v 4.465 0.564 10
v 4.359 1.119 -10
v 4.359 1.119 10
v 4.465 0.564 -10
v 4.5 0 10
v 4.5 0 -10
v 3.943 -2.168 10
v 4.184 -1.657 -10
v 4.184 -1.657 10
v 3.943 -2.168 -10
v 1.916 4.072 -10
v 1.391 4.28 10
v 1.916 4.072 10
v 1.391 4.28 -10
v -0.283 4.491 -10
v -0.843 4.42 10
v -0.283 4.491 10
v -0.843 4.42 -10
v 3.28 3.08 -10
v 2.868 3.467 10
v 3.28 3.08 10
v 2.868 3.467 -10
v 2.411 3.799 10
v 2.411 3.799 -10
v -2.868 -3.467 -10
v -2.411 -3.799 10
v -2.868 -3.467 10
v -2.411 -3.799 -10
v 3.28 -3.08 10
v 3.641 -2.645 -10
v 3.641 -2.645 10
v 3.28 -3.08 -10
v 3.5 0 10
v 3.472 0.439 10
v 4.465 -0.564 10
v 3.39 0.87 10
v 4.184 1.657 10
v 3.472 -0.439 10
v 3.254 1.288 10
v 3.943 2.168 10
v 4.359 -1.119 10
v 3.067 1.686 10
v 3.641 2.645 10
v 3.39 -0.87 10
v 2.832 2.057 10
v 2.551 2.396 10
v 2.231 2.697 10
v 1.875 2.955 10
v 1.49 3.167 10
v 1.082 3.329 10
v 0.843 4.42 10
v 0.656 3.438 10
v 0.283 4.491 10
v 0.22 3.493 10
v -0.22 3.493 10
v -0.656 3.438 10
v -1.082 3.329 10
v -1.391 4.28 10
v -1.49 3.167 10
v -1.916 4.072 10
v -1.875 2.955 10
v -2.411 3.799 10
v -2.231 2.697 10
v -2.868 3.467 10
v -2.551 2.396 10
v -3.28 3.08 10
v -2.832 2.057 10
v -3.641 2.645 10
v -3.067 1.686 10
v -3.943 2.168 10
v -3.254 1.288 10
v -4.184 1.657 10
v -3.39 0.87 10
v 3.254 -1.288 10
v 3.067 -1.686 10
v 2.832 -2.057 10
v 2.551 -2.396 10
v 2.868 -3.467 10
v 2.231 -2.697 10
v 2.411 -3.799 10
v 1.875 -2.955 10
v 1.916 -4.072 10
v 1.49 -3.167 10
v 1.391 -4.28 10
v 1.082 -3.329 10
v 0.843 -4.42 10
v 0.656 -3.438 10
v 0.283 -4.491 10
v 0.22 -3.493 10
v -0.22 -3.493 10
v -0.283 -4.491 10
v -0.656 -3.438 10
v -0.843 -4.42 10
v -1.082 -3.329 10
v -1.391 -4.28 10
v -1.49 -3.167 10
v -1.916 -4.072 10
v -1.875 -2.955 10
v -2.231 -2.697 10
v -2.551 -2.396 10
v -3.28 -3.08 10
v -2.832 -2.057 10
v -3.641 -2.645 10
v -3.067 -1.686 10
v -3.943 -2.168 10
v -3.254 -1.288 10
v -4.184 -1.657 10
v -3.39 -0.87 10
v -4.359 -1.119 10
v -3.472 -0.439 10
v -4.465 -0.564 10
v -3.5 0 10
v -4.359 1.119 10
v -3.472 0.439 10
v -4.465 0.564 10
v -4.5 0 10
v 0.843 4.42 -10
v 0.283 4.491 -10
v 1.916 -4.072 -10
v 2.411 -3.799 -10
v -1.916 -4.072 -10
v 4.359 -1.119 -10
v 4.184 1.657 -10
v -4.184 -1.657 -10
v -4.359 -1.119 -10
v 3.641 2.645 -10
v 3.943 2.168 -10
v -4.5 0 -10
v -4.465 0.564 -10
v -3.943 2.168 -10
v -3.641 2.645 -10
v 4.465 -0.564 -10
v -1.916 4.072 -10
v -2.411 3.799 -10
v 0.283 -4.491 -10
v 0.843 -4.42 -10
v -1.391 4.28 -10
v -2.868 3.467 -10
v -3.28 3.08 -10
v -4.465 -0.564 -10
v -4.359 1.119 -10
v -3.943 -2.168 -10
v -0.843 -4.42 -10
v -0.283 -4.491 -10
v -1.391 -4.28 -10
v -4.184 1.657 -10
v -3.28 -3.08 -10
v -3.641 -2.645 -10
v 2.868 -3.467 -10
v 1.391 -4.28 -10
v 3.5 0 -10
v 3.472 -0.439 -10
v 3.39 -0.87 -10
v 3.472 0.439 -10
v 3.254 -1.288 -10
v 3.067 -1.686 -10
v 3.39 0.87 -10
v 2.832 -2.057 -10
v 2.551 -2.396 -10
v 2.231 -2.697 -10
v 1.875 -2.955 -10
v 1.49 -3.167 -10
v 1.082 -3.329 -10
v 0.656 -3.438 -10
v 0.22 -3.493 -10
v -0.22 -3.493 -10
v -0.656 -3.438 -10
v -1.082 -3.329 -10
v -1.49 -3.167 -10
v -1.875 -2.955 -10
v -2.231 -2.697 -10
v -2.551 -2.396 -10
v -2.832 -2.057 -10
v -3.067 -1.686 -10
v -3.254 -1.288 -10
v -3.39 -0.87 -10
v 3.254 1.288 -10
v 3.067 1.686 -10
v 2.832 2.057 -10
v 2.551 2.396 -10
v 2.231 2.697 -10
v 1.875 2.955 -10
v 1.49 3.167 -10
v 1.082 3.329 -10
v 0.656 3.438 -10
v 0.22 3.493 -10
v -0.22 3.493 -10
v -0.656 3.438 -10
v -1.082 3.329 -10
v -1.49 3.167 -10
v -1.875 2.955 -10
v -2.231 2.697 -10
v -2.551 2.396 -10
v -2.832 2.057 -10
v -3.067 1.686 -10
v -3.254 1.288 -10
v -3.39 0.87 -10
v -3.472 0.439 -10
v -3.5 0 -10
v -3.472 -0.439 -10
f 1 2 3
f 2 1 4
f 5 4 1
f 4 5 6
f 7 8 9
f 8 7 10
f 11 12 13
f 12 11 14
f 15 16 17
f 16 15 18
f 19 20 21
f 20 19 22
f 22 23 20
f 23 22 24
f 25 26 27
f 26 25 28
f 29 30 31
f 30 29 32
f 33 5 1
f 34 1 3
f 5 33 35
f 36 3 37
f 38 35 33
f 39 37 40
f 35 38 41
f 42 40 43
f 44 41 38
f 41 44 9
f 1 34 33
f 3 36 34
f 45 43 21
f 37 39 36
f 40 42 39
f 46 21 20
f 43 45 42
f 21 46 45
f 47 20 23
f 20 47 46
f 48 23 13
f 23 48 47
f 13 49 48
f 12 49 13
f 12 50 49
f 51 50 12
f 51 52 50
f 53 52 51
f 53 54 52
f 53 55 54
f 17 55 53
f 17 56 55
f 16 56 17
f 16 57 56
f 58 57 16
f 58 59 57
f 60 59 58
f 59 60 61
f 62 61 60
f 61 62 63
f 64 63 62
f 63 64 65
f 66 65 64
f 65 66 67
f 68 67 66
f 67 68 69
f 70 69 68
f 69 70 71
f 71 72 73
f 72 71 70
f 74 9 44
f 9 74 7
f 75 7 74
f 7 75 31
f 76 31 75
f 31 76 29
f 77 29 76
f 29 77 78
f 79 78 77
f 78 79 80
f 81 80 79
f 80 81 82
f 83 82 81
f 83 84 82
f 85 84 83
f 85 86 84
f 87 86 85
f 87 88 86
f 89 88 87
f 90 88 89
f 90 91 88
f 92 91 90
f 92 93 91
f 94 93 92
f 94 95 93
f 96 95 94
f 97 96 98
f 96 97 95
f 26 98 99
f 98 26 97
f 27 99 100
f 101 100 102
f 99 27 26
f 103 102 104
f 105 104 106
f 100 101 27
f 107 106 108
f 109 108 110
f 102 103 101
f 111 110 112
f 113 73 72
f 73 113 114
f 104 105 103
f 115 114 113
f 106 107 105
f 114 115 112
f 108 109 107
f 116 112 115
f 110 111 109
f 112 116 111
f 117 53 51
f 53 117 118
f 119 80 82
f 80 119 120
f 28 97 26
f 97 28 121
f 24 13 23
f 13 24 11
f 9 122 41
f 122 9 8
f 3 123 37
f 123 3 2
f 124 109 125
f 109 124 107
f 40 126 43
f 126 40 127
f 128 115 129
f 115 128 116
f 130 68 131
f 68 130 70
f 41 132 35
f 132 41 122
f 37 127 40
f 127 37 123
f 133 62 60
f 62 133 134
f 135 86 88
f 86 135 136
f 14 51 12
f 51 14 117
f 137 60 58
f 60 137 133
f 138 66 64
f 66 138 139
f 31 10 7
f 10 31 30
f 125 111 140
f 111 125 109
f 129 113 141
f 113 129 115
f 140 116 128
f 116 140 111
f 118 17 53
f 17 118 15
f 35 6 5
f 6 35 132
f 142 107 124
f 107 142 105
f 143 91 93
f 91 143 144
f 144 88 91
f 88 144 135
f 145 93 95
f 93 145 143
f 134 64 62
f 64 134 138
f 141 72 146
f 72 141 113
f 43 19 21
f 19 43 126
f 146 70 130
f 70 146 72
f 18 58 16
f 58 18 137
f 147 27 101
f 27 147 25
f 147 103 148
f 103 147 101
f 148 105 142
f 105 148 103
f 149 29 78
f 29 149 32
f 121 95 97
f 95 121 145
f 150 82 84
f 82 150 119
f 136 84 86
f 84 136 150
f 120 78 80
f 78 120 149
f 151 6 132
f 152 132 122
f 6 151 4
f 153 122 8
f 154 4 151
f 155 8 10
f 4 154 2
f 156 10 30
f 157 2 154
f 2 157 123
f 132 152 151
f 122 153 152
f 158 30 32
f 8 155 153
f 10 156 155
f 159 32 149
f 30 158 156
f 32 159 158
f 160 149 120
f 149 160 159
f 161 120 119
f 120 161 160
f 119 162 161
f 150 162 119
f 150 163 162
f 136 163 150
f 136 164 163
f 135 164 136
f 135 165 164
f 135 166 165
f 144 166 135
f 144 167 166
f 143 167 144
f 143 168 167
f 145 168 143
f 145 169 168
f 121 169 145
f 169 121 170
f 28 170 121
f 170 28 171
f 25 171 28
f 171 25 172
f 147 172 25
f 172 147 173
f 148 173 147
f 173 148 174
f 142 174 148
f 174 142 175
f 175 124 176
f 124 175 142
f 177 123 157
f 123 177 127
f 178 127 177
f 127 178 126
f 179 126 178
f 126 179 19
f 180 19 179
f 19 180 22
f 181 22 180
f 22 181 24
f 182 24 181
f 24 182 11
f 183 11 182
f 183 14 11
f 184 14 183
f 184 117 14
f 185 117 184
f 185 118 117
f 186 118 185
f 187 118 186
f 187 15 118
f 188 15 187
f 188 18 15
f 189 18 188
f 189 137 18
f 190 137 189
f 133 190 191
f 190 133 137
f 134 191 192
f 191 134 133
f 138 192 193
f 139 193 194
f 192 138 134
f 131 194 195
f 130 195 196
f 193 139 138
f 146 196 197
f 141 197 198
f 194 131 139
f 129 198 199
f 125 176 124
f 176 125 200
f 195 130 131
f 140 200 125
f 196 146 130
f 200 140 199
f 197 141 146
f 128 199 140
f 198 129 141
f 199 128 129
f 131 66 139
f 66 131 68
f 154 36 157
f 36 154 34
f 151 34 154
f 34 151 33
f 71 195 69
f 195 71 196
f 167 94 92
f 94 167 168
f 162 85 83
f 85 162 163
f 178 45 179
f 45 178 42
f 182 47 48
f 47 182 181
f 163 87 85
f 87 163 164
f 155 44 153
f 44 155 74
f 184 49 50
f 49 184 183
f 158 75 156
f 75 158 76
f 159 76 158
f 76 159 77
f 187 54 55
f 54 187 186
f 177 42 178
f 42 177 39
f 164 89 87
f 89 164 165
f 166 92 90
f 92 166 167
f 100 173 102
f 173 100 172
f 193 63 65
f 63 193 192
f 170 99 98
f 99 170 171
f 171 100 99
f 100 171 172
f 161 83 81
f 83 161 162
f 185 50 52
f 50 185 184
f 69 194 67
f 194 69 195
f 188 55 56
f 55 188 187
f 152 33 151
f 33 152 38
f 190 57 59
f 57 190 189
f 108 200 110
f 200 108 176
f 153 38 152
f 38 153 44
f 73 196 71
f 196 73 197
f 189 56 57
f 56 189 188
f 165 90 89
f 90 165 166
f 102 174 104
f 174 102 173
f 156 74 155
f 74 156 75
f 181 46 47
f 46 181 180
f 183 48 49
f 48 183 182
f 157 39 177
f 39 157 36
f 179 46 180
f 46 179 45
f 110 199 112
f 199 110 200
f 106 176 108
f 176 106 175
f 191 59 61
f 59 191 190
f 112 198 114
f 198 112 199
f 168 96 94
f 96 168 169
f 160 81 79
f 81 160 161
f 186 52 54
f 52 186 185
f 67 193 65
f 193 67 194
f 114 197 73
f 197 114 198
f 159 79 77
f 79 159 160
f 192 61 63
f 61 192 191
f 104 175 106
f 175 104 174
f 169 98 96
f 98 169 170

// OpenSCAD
$fn = 50;


difference() {
	union() {
		translate(v = [0, 0, -10.0000000000]) {
			cylinder(h = 20, r = 4.5000000000);
		}
	}
	union() {
		translate(v = [0, 0, -100.0000000000]) {
			cylinder(h = 200, r = 3.5000000000);
		}
	}
}
